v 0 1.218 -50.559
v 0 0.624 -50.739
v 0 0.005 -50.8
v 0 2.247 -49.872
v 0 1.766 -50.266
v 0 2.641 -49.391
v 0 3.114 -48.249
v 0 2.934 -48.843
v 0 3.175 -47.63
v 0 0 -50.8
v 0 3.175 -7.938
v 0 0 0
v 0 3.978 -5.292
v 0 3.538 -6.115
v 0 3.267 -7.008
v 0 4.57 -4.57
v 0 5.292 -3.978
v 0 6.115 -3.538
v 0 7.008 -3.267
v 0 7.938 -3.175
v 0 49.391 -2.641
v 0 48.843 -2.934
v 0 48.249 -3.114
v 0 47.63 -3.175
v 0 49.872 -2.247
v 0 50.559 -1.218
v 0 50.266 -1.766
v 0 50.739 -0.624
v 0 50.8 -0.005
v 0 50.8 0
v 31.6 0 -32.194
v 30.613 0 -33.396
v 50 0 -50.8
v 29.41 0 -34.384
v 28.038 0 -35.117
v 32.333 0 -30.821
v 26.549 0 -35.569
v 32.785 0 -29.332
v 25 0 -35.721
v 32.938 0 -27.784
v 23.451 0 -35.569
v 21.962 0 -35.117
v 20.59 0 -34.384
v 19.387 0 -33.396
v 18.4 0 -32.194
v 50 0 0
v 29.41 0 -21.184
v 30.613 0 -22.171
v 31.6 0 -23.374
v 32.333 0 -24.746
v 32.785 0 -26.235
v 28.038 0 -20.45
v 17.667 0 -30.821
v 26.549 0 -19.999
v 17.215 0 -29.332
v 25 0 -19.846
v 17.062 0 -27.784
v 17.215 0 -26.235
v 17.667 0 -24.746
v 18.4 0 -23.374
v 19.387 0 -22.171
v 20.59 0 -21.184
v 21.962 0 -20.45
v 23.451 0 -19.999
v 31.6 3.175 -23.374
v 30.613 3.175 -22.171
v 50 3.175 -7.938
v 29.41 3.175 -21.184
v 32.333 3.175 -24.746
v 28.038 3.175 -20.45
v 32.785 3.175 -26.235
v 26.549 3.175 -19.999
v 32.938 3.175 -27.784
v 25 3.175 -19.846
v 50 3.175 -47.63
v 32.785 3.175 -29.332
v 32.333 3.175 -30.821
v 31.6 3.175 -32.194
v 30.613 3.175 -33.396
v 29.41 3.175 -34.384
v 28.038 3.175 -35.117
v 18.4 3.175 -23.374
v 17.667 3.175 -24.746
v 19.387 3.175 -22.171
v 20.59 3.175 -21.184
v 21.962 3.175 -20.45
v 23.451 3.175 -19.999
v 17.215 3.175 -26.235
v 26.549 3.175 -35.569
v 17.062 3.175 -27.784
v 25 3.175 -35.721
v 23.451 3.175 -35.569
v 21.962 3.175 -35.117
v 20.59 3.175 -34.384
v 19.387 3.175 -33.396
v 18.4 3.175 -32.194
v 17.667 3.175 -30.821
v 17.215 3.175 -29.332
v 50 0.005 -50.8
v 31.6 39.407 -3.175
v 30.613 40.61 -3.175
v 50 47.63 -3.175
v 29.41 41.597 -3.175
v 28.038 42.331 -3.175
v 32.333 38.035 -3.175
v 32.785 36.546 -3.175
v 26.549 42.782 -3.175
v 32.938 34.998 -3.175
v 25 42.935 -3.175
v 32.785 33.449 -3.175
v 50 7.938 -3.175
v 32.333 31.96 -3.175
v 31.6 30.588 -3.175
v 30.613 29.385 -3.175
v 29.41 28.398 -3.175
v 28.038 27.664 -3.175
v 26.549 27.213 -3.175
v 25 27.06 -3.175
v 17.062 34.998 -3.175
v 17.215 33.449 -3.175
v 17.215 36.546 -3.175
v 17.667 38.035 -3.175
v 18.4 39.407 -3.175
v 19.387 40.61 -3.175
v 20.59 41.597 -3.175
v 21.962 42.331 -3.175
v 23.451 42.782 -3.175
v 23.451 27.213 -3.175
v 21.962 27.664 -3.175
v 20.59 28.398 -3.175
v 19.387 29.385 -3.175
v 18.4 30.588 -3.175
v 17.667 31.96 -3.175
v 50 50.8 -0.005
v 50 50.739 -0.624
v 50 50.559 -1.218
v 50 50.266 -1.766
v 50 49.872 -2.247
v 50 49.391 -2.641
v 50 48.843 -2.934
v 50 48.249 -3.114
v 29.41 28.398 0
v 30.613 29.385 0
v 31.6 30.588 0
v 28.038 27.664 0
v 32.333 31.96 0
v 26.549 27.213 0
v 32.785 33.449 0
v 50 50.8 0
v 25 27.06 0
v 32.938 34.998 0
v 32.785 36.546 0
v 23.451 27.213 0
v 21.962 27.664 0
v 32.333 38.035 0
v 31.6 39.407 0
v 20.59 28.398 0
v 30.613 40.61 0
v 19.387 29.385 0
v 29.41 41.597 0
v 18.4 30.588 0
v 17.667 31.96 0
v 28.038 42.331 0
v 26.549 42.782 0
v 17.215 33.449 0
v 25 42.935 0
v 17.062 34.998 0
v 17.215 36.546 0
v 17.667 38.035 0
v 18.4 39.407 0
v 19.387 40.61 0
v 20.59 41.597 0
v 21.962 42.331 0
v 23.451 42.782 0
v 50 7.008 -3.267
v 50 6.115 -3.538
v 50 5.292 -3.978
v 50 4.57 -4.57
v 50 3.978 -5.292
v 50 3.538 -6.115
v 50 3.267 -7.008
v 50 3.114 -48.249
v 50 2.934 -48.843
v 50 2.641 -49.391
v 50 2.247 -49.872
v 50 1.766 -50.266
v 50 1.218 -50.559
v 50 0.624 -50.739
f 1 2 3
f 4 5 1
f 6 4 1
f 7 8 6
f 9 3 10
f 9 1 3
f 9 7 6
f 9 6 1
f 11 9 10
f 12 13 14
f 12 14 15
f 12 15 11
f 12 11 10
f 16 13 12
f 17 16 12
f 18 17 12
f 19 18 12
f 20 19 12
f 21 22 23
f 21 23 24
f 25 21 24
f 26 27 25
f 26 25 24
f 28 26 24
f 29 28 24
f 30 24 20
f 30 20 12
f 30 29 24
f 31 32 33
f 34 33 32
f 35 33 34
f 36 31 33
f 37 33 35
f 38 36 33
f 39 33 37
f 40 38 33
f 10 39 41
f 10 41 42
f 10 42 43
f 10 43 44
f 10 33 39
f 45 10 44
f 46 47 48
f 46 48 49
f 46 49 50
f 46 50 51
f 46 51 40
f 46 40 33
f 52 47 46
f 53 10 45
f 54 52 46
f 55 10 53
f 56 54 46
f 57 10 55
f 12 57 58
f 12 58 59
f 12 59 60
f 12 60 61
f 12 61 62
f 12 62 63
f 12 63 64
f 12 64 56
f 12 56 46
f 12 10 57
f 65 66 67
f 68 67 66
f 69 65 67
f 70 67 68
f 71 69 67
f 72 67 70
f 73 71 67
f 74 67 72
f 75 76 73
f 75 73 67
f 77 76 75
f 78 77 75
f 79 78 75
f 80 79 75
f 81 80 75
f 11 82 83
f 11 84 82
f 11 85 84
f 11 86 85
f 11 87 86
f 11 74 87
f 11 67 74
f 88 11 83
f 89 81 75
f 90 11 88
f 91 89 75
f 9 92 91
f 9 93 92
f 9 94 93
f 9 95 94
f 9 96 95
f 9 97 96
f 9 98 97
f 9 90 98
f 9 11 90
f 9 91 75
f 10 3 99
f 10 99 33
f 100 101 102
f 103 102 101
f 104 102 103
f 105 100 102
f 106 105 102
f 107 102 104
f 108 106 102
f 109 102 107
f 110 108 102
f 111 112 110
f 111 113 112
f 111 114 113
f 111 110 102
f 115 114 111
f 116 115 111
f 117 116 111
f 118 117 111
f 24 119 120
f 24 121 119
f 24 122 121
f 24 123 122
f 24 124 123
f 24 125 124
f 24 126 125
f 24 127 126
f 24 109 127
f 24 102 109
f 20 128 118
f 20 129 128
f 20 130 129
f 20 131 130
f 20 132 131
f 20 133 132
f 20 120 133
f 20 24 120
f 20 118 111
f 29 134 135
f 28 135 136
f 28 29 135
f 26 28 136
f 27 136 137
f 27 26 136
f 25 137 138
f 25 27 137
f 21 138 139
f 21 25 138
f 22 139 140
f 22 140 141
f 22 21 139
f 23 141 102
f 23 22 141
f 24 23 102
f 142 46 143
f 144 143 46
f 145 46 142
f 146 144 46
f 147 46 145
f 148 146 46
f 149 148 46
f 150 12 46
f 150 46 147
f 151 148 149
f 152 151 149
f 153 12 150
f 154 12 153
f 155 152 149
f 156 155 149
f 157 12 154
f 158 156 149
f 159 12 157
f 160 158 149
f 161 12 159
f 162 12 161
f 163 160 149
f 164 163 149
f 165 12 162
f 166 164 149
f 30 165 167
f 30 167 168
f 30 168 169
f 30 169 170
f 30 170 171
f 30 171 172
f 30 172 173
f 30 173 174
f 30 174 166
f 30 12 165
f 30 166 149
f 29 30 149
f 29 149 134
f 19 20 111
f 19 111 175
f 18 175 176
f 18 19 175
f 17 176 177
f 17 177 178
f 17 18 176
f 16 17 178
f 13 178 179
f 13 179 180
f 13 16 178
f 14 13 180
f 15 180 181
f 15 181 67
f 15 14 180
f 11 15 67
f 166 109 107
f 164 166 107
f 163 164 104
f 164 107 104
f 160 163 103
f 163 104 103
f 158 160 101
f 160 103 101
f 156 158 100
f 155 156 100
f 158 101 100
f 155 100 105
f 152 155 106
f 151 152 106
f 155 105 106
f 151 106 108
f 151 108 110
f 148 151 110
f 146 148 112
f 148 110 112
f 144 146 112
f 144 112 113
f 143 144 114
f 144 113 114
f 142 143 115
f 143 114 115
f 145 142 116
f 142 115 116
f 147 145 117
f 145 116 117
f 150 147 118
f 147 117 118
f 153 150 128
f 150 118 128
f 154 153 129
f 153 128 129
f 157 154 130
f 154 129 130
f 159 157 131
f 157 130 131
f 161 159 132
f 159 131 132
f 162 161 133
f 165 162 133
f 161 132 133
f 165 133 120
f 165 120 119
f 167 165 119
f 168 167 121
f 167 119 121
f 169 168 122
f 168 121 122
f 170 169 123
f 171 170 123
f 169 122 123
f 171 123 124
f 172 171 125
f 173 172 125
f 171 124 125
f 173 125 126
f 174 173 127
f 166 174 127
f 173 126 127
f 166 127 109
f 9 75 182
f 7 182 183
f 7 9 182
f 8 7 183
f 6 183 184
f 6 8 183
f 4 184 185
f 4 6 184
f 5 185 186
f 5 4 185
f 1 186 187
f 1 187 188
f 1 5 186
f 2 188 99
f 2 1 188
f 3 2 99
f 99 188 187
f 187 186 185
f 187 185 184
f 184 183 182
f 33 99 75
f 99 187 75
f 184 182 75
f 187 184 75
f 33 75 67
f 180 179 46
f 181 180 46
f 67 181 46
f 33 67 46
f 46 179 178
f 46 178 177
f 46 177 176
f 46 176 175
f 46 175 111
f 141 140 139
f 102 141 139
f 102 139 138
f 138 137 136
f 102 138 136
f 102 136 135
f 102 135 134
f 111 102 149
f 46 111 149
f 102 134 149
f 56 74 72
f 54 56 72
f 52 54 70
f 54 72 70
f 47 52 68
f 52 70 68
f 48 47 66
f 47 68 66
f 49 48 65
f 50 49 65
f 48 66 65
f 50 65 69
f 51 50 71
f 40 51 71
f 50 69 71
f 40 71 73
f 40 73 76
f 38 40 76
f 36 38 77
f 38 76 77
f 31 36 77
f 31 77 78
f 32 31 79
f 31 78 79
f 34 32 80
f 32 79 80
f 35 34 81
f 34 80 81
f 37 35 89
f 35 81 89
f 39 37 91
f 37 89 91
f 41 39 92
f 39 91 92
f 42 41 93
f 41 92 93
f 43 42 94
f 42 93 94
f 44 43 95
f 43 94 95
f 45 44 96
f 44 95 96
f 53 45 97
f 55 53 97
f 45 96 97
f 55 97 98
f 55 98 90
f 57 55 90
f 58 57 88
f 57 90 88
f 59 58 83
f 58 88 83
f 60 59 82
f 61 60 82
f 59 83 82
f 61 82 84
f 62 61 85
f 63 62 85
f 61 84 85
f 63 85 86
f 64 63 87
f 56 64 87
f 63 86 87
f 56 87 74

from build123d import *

# Parameters (mm, degrees)
ANGLE_IRON_2_X_2_X_0_125_1_DEPTH = 50
SKETCH4_R                        = 7.9375
CUT_EXTRUDE1_DEPTH               = 3.175
SKETCH3_R                        = 7.9375
CUT_EXTRUDE2_DEPTH               = 3.175


with BuildPart() as part:
    # Sketch1 → Angle iron 2 X 2 X 0.125(1) (new body)
    with BuildSketch(Plane(origin=(0, 0, 0), x_dir=(0, 0, -1), z_dir=(1, 0, 0))):
        with BuildLine():
            Line((0, 0), (0, 50.8))
            Line((0, 50.8), (0.00508, 50.8))
            ThreePointArc((0.00508, 50.8), (2.246551928, 49.871551928), (3.175, 47.63008))
            Line((3.175, 47.63008), (3.175, 7.9375))
            ThreePointArc((3.175, 7.9375), (4.569903955, 4.569903955), (7.9375, 3.175))
            Line((7.9375, 3.175), (47.63008, 3.175))
            ThreePointArc((47.63008, 3.175), (49.871551928, 2.246551928), (50.8, 0.00508))
            Line((50.8, 0.00508), (50.8, 0))
            Line((50.8, 0), (0, 0))
        make_face()
    extrude(amount=ANGLE_IRON_2_X_2_X_0_125_1_DEPTH)

    # Sketch4 → Cut-Extrude1 (cut)
    with BuildSketch(Plane(origin=(0, 3.175, 0), x_dir=(1, 0, 0), z_dir=(0, 1, 0))):
        with Locations(Location((25, 27.78379, 0), (0, 0, 270))):
            Circle(SKETCH4_R)
    extrude(amount=-CUT_EXTRUDE1_DEPTH, mode=Mode.SUBTRACT)

    # Sketch3 → Cut-Extrude2 (cut)
    with BuildSketch(Plane(origin=(0, 0, -3.175), x_dir=(-1, 0, 0), z_dir=(0, 0, -1))):
        with Locations(Location((-25, 34.9975, 0), (0, 0, 90))):
            Circle(SKETCH3_R)
    extrude(amount=-CUT_EXTRUDE2_DEPTH, mode=Mode.SUBTRACT)


solid = part.part
